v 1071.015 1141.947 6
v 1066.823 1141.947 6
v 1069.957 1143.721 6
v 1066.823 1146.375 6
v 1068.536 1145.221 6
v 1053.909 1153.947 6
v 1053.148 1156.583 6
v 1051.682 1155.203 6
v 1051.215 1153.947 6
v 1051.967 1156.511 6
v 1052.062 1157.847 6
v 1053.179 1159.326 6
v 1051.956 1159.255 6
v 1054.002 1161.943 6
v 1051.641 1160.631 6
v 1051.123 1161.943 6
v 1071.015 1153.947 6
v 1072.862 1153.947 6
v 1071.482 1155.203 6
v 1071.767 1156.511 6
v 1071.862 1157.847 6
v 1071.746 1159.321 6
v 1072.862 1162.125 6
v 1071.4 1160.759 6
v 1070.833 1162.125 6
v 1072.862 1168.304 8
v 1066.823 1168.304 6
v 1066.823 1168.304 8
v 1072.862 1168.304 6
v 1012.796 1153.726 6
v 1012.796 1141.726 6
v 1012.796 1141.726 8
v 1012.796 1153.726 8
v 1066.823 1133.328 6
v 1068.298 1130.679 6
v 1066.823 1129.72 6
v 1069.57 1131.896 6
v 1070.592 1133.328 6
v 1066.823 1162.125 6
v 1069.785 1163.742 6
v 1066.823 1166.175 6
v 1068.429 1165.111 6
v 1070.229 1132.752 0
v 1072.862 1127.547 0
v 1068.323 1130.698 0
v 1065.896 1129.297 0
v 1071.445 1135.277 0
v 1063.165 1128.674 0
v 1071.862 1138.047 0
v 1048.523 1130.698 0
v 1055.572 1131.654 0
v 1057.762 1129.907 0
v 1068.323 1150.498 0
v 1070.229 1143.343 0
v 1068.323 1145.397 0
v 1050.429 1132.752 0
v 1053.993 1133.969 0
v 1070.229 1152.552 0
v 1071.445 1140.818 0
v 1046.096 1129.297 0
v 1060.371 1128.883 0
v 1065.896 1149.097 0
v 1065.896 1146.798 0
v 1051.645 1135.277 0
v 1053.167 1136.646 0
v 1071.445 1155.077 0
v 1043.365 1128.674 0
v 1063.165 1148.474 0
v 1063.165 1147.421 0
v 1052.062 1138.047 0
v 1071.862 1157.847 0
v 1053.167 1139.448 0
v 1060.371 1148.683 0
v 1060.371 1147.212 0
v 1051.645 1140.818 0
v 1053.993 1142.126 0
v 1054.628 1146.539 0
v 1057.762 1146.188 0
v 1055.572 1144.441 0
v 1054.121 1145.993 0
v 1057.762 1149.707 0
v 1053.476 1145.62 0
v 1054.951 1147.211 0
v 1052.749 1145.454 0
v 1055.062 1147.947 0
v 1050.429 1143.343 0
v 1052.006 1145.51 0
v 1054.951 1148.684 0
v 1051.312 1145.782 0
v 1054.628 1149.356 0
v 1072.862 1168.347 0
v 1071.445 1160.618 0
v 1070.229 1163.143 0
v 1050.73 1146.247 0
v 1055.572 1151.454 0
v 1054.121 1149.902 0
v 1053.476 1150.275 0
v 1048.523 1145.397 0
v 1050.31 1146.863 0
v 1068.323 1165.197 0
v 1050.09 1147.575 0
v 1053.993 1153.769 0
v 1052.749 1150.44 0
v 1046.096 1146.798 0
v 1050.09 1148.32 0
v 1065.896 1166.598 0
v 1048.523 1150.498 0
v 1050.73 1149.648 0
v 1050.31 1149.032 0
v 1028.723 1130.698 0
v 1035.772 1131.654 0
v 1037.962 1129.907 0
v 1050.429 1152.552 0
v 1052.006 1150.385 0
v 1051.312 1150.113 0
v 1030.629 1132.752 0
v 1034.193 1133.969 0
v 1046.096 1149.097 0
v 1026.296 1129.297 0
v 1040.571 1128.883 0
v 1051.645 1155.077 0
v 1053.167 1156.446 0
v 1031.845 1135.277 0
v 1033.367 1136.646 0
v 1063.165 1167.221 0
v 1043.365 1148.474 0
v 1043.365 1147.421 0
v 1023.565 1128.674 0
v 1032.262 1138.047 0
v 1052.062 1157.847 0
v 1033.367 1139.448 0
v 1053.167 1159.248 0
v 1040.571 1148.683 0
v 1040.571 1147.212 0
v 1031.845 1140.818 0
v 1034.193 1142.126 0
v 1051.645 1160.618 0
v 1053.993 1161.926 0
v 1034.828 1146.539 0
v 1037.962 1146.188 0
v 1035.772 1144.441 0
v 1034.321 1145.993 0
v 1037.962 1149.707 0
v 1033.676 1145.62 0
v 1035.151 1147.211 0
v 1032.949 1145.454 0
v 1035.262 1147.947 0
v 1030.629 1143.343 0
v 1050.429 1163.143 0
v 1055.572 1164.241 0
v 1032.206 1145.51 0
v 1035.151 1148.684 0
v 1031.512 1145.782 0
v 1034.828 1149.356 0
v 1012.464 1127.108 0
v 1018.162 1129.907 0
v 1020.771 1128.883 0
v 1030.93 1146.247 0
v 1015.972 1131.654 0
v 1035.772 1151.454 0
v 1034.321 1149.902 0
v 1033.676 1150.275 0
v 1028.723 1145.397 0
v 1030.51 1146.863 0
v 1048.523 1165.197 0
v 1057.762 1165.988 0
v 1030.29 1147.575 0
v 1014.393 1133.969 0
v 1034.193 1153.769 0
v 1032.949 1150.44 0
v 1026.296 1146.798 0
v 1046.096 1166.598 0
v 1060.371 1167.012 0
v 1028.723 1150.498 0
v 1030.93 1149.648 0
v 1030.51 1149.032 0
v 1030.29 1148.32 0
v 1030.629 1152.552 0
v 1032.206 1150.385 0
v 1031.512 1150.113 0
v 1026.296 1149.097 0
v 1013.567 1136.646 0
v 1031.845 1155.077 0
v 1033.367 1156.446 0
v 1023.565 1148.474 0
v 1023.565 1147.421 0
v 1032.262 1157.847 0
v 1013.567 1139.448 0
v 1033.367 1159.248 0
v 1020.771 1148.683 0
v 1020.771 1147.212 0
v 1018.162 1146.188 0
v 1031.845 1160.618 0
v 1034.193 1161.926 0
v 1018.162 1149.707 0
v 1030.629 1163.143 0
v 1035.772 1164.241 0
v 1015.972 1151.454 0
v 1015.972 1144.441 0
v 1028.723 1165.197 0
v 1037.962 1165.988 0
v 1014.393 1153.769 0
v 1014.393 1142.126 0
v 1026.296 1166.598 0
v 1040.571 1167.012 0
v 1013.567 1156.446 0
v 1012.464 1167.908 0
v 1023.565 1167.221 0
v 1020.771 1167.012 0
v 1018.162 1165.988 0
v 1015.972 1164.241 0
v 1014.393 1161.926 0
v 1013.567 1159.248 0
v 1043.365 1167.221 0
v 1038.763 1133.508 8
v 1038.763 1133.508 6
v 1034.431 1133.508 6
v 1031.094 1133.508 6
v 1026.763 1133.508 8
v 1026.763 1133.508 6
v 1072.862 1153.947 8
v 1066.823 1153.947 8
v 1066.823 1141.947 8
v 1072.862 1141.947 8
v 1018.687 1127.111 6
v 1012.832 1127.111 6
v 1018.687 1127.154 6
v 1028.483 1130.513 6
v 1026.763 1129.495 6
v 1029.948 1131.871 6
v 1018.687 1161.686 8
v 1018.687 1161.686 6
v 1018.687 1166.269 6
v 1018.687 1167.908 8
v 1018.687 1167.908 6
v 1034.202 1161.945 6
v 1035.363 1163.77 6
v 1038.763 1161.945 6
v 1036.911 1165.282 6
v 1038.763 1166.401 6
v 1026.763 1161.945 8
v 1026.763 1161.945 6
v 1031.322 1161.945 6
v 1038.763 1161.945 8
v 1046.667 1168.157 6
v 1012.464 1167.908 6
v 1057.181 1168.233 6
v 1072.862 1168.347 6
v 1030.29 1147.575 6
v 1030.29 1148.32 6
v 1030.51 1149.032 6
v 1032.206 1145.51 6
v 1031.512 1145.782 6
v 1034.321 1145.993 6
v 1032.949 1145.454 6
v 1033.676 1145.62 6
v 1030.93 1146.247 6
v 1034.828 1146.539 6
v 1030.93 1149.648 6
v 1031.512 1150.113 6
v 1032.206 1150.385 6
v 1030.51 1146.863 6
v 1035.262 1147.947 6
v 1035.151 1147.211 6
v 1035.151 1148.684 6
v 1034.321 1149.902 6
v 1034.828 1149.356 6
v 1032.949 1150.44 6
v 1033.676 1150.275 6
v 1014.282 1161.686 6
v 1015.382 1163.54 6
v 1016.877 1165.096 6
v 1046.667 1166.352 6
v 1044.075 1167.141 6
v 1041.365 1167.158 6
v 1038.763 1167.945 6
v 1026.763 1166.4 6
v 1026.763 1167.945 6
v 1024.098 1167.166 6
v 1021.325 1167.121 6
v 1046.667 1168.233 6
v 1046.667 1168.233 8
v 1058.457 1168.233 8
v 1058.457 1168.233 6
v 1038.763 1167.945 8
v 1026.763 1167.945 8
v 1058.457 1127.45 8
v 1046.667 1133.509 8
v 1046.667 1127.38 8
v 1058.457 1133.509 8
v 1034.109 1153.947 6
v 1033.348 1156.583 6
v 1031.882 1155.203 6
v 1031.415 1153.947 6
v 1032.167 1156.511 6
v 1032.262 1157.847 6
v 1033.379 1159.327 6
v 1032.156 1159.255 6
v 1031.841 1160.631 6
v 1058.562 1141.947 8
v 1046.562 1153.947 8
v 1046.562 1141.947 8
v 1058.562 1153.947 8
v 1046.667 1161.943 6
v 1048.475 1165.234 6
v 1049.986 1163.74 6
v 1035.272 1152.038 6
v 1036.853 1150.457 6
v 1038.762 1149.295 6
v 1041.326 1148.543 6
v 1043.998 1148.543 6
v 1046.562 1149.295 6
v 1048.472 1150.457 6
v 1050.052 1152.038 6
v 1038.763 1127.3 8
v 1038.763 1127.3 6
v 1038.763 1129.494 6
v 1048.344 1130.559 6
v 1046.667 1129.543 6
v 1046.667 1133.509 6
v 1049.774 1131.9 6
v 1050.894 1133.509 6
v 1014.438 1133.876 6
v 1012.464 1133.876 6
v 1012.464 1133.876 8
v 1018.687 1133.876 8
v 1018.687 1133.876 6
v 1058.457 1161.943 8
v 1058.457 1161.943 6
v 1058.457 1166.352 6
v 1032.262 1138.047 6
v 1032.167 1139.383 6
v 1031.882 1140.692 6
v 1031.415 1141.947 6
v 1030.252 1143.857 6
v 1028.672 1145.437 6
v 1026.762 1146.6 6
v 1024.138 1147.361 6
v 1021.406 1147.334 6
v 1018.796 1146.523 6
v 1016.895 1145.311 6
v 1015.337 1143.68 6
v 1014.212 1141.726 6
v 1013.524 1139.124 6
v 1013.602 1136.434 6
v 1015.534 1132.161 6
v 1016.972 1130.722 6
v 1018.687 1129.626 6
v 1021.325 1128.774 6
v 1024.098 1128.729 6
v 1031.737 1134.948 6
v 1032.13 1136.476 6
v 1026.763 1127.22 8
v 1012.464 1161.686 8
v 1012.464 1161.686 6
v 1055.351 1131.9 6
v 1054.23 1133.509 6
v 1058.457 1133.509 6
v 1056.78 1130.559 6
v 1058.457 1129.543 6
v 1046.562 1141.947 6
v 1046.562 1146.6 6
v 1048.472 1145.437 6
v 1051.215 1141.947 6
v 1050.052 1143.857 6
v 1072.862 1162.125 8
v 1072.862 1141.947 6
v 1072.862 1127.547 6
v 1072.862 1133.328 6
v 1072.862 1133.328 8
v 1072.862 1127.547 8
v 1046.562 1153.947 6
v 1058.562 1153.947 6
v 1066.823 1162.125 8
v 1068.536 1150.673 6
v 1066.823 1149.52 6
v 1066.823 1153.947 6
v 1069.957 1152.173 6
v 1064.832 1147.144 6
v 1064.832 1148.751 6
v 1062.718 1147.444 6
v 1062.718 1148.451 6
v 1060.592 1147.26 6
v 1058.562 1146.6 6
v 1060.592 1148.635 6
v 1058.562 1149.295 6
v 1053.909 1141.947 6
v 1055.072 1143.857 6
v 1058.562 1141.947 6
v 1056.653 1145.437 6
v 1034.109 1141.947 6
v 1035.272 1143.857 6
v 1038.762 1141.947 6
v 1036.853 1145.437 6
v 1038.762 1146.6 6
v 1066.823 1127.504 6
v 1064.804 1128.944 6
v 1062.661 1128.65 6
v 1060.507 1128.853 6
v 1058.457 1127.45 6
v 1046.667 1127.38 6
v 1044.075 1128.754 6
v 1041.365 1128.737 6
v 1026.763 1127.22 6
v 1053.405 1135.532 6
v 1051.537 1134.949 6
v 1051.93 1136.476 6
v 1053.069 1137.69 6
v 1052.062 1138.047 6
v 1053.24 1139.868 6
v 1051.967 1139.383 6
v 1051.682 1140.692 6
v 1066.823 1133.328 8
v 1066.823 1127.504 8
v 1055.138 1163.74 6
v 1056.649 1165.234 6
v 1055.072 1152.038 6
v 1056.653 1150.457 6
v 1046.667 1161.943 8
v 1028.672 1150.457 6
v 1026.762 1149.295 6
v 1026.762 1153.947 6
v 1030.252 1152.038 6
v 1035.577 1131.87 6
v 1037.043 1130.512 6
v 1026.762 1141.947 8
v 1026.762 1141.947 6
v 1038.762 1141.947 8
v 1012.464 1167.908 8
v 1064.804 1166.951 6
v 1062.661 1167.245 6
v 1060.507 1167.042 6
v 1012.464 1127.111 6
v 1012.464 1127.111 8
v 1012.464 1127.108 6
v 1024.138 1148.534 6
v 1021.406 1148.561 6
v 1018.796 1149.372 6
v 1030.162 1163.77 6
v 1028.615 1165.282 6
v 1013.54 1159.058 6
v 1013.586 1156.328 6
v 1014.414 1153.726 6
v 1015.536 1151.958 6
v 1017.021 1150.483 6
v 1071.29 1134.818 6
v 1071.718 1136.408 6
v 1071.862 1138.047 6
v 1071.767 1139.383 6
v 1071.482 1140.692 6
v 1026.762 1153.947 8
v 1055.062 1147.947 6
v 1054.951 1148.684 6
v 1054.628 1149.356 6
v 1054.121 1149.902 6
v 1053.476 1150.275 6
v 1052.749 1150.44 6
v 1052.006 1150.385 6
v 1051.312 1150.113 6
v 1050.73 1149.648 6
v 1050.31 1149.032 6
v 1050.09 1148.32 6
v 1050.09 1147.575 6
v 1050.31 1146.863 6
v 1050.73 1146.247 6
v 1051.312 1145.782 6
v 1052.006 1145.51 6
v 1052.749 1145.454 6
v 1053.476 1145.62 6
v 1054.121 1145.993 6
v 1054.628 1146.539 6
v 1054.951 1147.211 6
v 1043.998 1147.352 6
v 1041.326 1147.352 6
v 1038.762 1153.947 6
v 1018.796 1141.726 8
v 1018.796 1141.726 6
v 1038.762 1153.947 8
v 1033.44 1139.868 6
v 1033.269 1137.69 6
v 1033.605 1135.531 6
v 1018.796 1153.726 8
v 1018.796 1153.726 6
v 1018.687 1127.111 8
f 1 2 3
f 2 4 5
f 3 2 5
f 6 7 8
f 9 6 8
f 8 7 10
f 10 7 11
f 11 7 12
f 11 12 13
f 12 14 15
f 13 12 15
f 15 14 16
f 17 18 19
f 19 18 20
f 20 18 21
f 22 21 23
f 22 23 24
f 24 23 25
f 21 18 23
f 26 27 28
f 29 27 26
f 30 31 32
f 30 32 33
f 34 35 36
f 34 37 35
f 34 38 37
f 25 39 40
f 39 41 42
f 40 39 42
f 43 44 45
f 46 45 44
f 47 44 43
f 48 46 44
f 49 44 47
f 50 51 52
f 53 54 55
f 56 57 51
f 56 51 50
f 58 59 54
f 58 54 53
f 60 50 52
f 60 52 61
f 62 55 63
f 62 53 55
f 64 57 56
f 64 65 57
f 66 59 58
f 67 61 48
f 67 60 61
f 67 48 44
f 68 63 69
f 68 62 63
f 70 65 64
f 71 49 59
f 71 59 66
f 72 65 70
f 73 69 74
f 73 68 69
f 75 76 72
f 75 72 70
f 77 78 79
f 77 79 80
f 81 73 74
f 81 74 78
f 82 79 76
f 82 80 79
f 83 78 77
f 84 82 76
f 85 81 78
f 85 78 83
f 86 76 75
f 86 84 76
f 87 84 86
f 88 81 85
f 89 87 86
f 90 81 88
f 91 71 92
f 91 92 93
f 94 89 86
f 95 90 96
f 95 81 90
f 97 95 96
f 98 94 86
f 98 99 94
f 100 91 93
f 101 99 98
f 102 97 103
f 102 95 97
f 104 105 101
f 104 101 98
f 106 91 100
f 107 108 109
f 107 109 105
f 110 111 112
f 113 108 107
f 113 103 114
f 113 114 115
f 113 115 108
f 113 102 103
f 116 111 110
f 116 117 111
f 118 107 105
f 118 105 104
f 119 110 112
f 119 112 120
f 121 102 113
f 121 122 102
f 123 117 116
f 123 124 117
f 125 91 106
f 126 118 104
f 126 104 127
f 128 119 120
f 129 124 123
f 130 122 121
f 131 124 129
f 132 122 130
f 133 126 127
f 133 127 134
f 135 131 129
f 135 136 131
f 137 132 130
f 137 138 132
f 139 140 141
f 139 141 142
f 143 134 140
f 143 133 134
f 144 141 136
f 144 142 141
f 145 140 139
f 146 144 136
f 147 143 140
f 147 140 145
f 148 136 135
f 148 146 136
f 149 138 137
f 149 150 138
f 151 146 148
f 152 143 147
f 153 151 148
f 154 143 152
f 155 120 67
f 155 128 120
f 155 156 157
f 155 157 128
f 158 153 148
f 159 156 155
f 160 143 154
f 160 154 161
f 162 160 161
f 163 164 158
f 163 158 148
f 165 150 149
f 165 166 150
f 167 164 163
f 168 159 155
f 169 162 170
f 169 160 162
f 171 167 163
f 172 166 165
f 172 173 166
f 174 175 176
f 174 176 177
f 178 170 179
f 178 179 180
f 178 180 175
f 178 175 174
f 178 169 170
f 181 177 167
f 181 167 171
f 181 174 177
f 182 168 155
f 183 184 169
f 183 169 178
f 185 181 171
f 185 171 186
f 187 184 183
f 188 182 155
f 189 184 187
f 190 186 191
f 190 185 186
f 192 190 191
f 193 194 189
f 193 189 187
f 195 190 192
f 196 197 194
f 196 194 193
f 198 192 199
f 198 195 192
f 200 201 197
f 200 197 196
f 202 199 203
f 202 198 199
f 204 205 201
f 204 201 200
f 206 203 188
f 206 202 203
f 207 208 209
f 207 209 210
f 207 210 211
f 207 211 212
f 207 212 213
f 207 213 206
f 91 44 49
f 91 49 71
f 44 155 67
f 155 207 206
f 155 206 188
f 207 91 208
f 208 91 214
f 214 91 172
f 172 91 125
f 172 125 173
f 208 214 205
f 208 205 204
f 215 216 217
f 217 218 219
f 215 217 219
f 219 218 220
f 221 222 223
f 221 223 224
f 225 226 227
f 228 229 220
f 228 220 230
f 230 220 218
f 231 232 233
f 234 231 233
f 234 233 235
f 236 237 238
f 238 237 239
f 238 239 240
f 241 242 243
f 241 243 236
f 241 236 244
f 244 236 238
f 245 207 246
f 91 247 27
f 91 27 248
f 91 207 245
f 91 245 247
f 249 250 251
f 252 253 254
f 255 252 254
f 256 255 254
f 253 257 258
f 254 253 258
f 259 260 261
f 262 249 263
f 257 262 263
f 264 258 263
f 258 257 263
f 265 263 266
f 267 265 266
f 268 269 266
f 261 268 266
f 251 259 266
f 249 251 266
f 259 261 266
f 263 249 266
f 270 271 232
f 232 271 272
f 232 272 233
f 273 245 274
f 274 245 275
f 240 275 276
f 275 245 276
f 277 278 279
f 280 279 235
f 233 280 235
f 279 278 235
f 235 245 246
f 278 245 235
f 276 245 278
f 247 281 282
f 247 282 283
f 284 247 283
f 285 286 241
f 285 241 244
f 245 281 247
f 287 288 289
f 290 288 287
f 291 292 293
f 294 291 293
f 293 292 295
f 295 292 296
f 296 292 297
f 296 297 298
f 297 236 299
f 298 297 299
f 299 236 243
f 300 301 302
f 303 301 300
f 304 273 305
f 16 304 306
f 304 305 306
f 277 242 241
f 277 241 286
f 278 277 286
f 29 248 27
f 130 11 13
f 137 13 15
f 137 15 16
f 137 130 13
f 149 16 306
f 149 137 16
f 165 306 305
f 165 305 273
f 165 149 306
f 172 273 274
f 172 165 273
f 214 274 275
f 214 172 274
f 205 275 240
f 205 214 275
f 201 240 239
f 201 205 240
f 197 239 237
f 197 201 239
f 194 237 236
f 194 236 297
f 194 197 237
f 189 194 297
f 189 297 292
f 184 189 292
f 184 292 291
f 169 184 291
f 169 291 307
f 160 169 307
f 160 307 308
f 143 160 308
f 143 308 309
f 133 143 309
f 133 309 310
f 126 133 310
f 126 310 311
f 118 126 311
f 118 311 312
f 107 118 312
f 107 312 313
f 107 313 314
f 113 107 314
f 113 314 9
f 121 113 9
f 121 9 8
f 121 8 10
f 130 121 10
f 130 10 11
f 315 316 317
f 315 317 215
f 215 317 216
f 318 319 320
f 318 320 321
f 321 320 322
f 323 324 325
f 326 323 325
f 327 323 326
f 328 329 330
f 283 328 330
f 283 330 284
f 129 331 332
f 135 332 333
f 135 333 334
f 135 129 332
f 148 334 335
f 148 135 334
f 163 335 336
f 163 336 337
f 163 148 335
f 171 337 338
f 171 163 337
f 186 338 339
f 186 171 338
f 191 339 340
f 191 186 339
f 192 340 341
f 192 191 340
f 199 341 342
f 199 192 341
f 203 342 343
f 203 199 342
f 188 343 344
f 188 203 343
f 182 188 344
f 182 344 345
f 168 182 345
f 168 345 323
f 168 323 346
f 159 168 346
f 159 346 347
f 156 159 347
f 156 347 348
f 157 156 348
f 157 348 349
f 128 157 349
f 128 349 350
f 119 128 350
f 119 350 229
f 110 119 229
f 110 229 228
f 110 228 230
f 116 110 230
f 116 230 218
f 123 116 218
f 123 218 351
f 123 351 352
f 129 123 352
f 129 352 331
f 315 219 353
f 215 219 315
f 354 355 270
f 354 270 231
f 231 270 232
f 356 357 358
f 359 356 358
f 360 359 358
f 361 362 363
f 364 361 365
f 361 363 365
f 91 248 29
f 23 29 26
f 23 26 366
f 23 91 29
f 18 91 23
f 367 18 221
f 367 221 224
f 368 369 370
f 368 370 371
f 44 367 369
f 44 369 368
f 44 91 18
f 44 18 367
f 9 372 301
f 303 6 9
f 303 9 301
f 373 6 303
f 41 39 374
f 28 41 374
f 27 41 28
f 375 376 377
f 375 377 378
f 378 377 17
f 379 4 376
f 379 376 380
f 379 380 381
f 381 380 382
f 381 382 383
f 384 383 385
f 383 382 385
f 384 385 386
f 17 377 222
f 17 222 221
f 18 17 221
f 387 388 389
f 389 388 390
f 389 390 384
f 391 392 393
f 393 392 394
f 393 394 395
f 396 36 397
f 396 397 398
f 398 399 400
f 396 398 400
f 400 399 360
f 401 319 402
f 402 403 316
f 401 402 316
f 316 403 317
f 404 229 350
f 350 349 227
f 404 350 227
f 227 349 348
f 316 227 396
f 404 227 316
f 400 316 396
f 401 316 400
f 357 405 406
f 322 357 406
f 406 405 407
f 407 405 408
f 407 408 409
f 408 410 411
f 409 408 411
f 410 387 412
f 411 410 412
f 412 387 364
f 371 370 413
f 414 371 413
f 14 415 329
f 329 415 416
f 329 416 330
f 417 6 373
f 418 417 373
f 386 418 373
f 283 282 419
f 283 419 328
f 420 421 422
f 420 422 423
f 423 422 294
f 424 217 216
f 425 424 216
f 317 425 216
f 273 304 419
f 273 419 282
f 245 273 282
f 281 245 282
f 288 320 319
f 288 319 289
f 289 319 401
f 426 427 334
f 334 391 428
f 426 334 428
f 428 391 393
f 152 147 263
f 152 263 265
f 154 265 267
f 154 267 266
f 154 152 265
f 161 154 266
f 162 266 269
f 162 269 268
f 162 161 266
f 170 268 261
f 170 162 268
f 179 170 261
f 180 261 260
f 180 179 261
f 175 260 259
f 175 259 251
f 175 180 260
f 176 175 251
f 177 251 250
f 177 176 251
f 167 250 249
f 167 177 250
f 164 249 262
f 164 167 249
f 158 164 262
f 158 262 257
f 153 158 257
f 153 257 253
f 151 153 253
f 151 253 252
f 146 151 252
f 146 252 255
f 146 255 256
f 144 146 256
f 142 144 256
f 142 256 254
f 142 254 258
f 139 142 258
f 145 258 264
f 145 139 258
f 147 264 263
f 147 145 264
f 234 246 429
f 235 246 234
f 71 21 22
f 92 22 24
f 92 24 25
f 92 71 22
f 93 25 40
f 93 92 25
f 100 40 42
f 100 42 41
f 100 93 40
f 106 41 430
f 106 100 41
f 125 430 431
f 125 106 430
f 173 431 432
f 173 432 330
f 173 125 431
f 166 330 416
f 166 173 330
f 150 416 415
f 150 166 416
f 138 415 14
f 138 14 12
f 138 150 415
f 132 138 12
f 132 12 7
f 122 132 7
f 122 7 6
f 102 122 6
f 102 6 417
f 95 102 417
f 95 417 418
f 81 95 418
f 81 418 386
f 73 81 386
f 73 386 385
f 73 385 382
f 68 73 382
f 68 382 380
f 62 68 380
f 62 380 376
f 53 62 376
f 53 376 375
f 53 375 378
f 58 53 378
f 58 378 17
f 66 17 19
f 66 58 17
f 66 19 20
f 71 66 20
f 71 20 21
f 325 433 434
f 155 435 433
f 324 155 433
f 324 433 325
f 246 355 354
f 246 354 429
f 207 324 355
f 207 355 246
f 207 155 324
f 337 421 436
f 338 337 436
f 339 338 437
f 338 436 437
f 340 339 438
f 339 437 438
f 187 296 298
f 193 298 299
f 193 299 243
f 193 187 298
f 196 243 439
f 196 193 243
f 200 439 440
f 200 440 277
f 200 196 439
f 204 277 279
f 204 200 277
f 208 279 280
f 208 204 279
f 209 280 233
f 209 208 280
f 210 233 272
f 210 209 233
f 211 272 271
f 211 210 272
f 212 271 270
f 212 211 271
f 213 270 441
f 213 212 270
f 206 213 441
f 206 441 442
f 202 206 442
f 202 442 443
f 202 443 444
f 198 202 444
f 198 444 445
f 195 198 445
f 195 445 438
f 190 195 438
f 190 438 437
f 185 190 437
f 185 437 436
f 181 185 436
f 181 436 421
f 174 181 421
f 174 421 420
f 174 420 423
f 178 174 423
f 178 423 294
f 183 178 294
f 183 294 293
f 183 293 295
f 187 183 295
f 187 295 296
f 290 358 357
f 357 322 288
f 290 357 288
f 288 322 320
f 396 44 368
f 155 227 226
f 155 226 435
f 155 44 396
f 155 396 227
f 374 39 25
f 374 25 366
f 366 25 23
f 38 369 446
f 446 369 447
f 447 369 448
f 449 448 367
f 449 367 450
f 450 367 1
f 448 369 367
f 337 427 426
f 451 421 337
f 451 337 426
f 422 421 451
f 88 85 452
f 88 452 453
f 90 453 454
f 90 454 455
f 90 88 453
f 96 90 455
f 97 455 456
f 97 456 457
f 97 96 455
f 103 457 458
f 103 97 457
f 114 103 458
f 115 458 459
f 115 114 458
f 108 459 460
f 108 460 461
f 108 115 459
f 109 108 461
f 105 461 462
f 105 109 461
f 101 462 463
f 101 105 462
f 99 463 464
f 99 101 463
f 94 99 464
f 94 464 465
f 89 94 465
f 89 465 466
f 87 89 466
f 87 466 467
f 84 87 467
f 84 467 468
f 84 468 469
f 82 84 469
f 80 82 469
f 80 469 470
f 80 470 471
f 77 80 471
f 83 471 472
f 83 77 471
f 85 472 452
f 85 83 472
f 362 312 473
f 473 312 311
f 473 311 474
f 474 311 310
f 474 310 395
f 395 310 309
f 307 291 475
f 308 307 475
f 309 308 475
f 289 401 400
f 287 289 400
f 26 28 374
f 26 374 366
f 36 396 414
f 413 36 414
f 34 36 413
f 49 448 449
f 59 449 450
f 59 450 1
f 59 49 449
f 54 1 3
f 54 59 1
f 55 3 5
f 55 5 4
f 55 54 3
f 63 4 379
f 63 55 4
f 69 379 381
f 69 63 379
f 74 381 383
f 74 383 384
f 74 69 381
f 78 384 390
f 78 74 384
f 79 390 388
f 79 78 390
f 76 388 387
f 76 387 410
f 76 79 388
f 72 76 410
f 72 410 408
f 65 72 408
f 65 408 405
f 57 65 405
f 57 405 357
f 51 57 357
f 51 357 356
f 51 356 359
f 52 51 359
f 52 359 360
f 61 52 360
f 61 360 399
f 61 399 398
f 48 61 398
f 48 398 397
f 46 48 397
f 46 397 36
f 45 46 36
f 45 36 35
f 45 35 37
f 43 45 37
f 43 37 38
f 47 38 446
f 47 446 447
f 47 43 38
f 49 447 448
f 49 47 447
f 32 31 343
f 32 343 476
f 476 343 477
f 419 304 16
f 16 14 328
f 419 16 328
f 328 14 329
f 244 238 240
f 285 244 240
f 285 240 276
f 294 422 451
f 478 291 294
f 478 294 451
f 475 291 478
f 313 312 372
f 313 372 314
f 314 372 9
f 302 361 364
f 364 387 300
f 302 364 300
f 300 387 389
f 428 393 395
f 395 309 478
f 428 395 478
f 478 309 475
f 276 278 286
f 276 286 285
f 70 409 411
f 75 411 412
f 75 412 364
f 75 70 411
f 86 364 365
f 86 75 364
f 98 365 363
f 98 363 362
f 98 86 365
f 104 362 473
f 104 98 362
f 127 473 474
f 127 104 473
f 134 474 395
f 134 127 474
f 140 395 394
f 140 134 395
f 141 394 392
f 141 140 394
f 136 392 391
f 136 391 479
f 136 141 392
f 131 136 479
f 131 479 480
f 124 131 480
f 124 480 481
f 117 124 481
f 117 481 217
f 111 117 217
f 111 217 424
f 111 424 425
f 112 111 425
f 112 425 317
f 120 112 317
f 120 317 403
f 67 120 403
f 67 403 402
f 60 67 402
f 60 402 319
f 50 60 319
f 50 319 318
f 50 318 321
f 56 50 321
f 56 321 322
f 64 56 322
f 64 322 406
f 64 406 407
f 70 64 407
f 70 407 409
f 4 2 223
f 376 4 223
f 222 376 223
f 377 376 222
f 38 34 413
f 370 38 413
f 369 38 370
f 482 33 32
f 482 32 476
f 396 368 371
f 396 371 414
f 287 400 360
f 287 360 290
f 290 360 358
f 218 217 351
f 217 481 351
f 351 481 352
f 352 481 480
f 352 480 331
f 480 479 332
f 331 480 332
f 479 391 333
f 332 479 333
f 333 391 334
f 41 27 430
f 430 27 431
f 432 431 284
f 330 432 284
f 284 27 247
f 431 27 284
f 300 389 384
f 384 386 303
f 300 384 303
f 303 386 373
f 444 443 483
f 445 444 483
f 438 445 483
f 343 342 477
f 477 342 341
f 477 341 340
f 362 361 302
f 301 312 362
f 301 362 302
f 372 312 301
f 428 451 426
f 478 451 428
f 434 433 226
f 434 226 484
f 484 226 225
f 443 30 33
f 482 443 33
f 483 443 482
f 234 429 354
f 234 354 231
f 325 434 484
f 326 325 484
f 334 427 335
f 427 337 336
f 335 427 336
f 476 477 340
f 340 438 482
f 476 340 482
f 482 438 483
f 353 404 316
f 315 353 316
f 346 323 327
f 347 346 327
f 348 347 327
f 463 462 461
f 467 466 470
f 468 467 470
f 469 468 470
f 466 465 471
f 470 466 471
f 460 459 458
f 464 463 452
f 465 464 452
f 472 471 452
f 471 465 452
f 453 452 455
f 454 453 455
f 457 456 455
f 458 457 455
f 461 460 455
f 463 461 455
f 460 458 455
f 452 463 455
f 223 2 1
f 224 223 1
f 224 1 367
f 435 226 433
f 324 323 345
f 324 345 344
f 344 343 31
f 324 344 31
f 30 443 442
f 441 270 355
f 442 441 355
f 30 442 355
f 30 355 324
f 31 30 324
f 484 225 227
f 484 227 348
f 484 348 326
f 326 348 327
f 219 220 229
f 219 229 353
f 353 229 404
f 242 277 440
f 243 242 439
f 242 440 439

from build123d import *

# Parameters (mm, degrees)
MODEL_R         = 9.4
MODEL_R_2       = 2.5
EXTRUDE_1_DEPTH = 6
SKETCH_2_W      = 6.222861065
SKETCH_2_H      = 6.222861065
SKETCH_2_W_2    = 12
SKETCH_2_H_2    = 6
SKETCH_2_W_3    = 11.79
SKETCH_2_H_3    = 6.29
SKETCH_2_W_4    = 6.039723033
SKETCH_2_H_4    = 6.178960273
SKETCH_2_H_5    = 12
SKETCH_2_W_5    = 6
SKETCH_2_H_6    = 6.764977387
EXTRUDE_2_DEPTH = 2


with BuildPart() as part:
    # Model → 凸台-拉伸1 (new body)
    with BuildSketch(Plane.XY):
        Polygon((1072.862228674, 1168.347447046), (1072.862228674, 1127.547447046), (1012.463824187, 1127.108430595), (1012.463824187, 1167.908430595), align=None)
        with Locations((1022.862228674, 1157.847447046)):
            Circle(MODEL_R, mode=Mode.SUBTRACT)
        with Locations((1042.662228674, 1157.847447046)):
            Circle(MODEL_R, mode=Mode.SUBTRACT)
        with Locations((1062.462228674, 1157.847447046)):
            Circle(MODEL_R, mode=Mode.SUBTRACT)
        with Locations((1022.862228674, 1138.047447046)):
            Circle(MODEL_R, mode=Mode.SUBTRACT)
        with Locations((1042.662228674, 1138.047447046)):
            Circle(MODEL_R, mode=Mode.SUBTRACT)
        with Locations((1062.462228674, 1138.047447046)):
            Circle(MODEL_R, mode=Mode.SUBTRACT)
        with Locations((1032.762228674, 1147.947447046)):
            Circle(MODEL_R_2, mode=Mode.SUBTRACT)
        with Locations((1052.562228674, 1147.947447046)):
            Circle(MODEL_R_2, mode=Mode.SUBTRACT)
    extrude(amount=EXTRUDE_1_DEPTH)

    # 草图2 → 凸台-拉伸2 (add)
    with BuildSketch(Plane.XY.offset(6)):
        with Locations((1015.57525472, 1164.797000063)):
            Rectangle(SKETCH_2_W, SKETCH_2_H)
        Polygon((1072.862228674, 1133.328066092), (1072.862228674, 1127.547447046), (1066.822505641, 1127.503546254), (1066.822505641, 1133.328066092), align=None)
        with Locations((1032.763038583, 1164.944548481)):
            Rectangle(SKETCH_2_W_2, SKETCH_2_H_2)
        with Locations((1052.562228674, 1165.088462385)):
            Rectangle(SKETCH_2_W_3, SKETCH_2_H_3)
        with Locations((1069.842367158, 1165.214066118)):
            Rectangle(SKETCH_2_W_4, SKETCH_2_H_4)
        with Locations((1032.762228674, 1147.947447046)):
            Rectangle(SKETCH_2_W_2, SKETCH_2_H_5)
        with Locations((1052.562228674, 1147.947447046)):
            Rectangle(SKETCH_2_W_2, SKETCH_2_H_5)
        with Locations((1069.842367158, 1147.947447046)):
            Rectangle(SKETCH_2_W_4, SKETCH_2_H_5)
        with Locations((1015.796351171, 1147.726326037)):
            Rectangle(SKETCH_2_W_5, SKETCH_2_H_5)
        Polygon((1058.457228674, 1127.45), (1058.457228674, 1133.509189688), (1046.667228674, 1133.509189688), (1046.667228674, 1127.38), align=None)
        Polygon((1038.763038583, 1127.3), (1038.763038583, 1133.508103592), (1026.763038583, 1133.508103592), (1026.763038583, 1127.22), align=None)
        with Locations((1015.57525472, 1130.493598172)):
            Rectangle(SKETCH_2_W, SKETCH_2_H_6)
    extrude(amount=EXTRUDE_2_DEPTH)


solid = part.part
